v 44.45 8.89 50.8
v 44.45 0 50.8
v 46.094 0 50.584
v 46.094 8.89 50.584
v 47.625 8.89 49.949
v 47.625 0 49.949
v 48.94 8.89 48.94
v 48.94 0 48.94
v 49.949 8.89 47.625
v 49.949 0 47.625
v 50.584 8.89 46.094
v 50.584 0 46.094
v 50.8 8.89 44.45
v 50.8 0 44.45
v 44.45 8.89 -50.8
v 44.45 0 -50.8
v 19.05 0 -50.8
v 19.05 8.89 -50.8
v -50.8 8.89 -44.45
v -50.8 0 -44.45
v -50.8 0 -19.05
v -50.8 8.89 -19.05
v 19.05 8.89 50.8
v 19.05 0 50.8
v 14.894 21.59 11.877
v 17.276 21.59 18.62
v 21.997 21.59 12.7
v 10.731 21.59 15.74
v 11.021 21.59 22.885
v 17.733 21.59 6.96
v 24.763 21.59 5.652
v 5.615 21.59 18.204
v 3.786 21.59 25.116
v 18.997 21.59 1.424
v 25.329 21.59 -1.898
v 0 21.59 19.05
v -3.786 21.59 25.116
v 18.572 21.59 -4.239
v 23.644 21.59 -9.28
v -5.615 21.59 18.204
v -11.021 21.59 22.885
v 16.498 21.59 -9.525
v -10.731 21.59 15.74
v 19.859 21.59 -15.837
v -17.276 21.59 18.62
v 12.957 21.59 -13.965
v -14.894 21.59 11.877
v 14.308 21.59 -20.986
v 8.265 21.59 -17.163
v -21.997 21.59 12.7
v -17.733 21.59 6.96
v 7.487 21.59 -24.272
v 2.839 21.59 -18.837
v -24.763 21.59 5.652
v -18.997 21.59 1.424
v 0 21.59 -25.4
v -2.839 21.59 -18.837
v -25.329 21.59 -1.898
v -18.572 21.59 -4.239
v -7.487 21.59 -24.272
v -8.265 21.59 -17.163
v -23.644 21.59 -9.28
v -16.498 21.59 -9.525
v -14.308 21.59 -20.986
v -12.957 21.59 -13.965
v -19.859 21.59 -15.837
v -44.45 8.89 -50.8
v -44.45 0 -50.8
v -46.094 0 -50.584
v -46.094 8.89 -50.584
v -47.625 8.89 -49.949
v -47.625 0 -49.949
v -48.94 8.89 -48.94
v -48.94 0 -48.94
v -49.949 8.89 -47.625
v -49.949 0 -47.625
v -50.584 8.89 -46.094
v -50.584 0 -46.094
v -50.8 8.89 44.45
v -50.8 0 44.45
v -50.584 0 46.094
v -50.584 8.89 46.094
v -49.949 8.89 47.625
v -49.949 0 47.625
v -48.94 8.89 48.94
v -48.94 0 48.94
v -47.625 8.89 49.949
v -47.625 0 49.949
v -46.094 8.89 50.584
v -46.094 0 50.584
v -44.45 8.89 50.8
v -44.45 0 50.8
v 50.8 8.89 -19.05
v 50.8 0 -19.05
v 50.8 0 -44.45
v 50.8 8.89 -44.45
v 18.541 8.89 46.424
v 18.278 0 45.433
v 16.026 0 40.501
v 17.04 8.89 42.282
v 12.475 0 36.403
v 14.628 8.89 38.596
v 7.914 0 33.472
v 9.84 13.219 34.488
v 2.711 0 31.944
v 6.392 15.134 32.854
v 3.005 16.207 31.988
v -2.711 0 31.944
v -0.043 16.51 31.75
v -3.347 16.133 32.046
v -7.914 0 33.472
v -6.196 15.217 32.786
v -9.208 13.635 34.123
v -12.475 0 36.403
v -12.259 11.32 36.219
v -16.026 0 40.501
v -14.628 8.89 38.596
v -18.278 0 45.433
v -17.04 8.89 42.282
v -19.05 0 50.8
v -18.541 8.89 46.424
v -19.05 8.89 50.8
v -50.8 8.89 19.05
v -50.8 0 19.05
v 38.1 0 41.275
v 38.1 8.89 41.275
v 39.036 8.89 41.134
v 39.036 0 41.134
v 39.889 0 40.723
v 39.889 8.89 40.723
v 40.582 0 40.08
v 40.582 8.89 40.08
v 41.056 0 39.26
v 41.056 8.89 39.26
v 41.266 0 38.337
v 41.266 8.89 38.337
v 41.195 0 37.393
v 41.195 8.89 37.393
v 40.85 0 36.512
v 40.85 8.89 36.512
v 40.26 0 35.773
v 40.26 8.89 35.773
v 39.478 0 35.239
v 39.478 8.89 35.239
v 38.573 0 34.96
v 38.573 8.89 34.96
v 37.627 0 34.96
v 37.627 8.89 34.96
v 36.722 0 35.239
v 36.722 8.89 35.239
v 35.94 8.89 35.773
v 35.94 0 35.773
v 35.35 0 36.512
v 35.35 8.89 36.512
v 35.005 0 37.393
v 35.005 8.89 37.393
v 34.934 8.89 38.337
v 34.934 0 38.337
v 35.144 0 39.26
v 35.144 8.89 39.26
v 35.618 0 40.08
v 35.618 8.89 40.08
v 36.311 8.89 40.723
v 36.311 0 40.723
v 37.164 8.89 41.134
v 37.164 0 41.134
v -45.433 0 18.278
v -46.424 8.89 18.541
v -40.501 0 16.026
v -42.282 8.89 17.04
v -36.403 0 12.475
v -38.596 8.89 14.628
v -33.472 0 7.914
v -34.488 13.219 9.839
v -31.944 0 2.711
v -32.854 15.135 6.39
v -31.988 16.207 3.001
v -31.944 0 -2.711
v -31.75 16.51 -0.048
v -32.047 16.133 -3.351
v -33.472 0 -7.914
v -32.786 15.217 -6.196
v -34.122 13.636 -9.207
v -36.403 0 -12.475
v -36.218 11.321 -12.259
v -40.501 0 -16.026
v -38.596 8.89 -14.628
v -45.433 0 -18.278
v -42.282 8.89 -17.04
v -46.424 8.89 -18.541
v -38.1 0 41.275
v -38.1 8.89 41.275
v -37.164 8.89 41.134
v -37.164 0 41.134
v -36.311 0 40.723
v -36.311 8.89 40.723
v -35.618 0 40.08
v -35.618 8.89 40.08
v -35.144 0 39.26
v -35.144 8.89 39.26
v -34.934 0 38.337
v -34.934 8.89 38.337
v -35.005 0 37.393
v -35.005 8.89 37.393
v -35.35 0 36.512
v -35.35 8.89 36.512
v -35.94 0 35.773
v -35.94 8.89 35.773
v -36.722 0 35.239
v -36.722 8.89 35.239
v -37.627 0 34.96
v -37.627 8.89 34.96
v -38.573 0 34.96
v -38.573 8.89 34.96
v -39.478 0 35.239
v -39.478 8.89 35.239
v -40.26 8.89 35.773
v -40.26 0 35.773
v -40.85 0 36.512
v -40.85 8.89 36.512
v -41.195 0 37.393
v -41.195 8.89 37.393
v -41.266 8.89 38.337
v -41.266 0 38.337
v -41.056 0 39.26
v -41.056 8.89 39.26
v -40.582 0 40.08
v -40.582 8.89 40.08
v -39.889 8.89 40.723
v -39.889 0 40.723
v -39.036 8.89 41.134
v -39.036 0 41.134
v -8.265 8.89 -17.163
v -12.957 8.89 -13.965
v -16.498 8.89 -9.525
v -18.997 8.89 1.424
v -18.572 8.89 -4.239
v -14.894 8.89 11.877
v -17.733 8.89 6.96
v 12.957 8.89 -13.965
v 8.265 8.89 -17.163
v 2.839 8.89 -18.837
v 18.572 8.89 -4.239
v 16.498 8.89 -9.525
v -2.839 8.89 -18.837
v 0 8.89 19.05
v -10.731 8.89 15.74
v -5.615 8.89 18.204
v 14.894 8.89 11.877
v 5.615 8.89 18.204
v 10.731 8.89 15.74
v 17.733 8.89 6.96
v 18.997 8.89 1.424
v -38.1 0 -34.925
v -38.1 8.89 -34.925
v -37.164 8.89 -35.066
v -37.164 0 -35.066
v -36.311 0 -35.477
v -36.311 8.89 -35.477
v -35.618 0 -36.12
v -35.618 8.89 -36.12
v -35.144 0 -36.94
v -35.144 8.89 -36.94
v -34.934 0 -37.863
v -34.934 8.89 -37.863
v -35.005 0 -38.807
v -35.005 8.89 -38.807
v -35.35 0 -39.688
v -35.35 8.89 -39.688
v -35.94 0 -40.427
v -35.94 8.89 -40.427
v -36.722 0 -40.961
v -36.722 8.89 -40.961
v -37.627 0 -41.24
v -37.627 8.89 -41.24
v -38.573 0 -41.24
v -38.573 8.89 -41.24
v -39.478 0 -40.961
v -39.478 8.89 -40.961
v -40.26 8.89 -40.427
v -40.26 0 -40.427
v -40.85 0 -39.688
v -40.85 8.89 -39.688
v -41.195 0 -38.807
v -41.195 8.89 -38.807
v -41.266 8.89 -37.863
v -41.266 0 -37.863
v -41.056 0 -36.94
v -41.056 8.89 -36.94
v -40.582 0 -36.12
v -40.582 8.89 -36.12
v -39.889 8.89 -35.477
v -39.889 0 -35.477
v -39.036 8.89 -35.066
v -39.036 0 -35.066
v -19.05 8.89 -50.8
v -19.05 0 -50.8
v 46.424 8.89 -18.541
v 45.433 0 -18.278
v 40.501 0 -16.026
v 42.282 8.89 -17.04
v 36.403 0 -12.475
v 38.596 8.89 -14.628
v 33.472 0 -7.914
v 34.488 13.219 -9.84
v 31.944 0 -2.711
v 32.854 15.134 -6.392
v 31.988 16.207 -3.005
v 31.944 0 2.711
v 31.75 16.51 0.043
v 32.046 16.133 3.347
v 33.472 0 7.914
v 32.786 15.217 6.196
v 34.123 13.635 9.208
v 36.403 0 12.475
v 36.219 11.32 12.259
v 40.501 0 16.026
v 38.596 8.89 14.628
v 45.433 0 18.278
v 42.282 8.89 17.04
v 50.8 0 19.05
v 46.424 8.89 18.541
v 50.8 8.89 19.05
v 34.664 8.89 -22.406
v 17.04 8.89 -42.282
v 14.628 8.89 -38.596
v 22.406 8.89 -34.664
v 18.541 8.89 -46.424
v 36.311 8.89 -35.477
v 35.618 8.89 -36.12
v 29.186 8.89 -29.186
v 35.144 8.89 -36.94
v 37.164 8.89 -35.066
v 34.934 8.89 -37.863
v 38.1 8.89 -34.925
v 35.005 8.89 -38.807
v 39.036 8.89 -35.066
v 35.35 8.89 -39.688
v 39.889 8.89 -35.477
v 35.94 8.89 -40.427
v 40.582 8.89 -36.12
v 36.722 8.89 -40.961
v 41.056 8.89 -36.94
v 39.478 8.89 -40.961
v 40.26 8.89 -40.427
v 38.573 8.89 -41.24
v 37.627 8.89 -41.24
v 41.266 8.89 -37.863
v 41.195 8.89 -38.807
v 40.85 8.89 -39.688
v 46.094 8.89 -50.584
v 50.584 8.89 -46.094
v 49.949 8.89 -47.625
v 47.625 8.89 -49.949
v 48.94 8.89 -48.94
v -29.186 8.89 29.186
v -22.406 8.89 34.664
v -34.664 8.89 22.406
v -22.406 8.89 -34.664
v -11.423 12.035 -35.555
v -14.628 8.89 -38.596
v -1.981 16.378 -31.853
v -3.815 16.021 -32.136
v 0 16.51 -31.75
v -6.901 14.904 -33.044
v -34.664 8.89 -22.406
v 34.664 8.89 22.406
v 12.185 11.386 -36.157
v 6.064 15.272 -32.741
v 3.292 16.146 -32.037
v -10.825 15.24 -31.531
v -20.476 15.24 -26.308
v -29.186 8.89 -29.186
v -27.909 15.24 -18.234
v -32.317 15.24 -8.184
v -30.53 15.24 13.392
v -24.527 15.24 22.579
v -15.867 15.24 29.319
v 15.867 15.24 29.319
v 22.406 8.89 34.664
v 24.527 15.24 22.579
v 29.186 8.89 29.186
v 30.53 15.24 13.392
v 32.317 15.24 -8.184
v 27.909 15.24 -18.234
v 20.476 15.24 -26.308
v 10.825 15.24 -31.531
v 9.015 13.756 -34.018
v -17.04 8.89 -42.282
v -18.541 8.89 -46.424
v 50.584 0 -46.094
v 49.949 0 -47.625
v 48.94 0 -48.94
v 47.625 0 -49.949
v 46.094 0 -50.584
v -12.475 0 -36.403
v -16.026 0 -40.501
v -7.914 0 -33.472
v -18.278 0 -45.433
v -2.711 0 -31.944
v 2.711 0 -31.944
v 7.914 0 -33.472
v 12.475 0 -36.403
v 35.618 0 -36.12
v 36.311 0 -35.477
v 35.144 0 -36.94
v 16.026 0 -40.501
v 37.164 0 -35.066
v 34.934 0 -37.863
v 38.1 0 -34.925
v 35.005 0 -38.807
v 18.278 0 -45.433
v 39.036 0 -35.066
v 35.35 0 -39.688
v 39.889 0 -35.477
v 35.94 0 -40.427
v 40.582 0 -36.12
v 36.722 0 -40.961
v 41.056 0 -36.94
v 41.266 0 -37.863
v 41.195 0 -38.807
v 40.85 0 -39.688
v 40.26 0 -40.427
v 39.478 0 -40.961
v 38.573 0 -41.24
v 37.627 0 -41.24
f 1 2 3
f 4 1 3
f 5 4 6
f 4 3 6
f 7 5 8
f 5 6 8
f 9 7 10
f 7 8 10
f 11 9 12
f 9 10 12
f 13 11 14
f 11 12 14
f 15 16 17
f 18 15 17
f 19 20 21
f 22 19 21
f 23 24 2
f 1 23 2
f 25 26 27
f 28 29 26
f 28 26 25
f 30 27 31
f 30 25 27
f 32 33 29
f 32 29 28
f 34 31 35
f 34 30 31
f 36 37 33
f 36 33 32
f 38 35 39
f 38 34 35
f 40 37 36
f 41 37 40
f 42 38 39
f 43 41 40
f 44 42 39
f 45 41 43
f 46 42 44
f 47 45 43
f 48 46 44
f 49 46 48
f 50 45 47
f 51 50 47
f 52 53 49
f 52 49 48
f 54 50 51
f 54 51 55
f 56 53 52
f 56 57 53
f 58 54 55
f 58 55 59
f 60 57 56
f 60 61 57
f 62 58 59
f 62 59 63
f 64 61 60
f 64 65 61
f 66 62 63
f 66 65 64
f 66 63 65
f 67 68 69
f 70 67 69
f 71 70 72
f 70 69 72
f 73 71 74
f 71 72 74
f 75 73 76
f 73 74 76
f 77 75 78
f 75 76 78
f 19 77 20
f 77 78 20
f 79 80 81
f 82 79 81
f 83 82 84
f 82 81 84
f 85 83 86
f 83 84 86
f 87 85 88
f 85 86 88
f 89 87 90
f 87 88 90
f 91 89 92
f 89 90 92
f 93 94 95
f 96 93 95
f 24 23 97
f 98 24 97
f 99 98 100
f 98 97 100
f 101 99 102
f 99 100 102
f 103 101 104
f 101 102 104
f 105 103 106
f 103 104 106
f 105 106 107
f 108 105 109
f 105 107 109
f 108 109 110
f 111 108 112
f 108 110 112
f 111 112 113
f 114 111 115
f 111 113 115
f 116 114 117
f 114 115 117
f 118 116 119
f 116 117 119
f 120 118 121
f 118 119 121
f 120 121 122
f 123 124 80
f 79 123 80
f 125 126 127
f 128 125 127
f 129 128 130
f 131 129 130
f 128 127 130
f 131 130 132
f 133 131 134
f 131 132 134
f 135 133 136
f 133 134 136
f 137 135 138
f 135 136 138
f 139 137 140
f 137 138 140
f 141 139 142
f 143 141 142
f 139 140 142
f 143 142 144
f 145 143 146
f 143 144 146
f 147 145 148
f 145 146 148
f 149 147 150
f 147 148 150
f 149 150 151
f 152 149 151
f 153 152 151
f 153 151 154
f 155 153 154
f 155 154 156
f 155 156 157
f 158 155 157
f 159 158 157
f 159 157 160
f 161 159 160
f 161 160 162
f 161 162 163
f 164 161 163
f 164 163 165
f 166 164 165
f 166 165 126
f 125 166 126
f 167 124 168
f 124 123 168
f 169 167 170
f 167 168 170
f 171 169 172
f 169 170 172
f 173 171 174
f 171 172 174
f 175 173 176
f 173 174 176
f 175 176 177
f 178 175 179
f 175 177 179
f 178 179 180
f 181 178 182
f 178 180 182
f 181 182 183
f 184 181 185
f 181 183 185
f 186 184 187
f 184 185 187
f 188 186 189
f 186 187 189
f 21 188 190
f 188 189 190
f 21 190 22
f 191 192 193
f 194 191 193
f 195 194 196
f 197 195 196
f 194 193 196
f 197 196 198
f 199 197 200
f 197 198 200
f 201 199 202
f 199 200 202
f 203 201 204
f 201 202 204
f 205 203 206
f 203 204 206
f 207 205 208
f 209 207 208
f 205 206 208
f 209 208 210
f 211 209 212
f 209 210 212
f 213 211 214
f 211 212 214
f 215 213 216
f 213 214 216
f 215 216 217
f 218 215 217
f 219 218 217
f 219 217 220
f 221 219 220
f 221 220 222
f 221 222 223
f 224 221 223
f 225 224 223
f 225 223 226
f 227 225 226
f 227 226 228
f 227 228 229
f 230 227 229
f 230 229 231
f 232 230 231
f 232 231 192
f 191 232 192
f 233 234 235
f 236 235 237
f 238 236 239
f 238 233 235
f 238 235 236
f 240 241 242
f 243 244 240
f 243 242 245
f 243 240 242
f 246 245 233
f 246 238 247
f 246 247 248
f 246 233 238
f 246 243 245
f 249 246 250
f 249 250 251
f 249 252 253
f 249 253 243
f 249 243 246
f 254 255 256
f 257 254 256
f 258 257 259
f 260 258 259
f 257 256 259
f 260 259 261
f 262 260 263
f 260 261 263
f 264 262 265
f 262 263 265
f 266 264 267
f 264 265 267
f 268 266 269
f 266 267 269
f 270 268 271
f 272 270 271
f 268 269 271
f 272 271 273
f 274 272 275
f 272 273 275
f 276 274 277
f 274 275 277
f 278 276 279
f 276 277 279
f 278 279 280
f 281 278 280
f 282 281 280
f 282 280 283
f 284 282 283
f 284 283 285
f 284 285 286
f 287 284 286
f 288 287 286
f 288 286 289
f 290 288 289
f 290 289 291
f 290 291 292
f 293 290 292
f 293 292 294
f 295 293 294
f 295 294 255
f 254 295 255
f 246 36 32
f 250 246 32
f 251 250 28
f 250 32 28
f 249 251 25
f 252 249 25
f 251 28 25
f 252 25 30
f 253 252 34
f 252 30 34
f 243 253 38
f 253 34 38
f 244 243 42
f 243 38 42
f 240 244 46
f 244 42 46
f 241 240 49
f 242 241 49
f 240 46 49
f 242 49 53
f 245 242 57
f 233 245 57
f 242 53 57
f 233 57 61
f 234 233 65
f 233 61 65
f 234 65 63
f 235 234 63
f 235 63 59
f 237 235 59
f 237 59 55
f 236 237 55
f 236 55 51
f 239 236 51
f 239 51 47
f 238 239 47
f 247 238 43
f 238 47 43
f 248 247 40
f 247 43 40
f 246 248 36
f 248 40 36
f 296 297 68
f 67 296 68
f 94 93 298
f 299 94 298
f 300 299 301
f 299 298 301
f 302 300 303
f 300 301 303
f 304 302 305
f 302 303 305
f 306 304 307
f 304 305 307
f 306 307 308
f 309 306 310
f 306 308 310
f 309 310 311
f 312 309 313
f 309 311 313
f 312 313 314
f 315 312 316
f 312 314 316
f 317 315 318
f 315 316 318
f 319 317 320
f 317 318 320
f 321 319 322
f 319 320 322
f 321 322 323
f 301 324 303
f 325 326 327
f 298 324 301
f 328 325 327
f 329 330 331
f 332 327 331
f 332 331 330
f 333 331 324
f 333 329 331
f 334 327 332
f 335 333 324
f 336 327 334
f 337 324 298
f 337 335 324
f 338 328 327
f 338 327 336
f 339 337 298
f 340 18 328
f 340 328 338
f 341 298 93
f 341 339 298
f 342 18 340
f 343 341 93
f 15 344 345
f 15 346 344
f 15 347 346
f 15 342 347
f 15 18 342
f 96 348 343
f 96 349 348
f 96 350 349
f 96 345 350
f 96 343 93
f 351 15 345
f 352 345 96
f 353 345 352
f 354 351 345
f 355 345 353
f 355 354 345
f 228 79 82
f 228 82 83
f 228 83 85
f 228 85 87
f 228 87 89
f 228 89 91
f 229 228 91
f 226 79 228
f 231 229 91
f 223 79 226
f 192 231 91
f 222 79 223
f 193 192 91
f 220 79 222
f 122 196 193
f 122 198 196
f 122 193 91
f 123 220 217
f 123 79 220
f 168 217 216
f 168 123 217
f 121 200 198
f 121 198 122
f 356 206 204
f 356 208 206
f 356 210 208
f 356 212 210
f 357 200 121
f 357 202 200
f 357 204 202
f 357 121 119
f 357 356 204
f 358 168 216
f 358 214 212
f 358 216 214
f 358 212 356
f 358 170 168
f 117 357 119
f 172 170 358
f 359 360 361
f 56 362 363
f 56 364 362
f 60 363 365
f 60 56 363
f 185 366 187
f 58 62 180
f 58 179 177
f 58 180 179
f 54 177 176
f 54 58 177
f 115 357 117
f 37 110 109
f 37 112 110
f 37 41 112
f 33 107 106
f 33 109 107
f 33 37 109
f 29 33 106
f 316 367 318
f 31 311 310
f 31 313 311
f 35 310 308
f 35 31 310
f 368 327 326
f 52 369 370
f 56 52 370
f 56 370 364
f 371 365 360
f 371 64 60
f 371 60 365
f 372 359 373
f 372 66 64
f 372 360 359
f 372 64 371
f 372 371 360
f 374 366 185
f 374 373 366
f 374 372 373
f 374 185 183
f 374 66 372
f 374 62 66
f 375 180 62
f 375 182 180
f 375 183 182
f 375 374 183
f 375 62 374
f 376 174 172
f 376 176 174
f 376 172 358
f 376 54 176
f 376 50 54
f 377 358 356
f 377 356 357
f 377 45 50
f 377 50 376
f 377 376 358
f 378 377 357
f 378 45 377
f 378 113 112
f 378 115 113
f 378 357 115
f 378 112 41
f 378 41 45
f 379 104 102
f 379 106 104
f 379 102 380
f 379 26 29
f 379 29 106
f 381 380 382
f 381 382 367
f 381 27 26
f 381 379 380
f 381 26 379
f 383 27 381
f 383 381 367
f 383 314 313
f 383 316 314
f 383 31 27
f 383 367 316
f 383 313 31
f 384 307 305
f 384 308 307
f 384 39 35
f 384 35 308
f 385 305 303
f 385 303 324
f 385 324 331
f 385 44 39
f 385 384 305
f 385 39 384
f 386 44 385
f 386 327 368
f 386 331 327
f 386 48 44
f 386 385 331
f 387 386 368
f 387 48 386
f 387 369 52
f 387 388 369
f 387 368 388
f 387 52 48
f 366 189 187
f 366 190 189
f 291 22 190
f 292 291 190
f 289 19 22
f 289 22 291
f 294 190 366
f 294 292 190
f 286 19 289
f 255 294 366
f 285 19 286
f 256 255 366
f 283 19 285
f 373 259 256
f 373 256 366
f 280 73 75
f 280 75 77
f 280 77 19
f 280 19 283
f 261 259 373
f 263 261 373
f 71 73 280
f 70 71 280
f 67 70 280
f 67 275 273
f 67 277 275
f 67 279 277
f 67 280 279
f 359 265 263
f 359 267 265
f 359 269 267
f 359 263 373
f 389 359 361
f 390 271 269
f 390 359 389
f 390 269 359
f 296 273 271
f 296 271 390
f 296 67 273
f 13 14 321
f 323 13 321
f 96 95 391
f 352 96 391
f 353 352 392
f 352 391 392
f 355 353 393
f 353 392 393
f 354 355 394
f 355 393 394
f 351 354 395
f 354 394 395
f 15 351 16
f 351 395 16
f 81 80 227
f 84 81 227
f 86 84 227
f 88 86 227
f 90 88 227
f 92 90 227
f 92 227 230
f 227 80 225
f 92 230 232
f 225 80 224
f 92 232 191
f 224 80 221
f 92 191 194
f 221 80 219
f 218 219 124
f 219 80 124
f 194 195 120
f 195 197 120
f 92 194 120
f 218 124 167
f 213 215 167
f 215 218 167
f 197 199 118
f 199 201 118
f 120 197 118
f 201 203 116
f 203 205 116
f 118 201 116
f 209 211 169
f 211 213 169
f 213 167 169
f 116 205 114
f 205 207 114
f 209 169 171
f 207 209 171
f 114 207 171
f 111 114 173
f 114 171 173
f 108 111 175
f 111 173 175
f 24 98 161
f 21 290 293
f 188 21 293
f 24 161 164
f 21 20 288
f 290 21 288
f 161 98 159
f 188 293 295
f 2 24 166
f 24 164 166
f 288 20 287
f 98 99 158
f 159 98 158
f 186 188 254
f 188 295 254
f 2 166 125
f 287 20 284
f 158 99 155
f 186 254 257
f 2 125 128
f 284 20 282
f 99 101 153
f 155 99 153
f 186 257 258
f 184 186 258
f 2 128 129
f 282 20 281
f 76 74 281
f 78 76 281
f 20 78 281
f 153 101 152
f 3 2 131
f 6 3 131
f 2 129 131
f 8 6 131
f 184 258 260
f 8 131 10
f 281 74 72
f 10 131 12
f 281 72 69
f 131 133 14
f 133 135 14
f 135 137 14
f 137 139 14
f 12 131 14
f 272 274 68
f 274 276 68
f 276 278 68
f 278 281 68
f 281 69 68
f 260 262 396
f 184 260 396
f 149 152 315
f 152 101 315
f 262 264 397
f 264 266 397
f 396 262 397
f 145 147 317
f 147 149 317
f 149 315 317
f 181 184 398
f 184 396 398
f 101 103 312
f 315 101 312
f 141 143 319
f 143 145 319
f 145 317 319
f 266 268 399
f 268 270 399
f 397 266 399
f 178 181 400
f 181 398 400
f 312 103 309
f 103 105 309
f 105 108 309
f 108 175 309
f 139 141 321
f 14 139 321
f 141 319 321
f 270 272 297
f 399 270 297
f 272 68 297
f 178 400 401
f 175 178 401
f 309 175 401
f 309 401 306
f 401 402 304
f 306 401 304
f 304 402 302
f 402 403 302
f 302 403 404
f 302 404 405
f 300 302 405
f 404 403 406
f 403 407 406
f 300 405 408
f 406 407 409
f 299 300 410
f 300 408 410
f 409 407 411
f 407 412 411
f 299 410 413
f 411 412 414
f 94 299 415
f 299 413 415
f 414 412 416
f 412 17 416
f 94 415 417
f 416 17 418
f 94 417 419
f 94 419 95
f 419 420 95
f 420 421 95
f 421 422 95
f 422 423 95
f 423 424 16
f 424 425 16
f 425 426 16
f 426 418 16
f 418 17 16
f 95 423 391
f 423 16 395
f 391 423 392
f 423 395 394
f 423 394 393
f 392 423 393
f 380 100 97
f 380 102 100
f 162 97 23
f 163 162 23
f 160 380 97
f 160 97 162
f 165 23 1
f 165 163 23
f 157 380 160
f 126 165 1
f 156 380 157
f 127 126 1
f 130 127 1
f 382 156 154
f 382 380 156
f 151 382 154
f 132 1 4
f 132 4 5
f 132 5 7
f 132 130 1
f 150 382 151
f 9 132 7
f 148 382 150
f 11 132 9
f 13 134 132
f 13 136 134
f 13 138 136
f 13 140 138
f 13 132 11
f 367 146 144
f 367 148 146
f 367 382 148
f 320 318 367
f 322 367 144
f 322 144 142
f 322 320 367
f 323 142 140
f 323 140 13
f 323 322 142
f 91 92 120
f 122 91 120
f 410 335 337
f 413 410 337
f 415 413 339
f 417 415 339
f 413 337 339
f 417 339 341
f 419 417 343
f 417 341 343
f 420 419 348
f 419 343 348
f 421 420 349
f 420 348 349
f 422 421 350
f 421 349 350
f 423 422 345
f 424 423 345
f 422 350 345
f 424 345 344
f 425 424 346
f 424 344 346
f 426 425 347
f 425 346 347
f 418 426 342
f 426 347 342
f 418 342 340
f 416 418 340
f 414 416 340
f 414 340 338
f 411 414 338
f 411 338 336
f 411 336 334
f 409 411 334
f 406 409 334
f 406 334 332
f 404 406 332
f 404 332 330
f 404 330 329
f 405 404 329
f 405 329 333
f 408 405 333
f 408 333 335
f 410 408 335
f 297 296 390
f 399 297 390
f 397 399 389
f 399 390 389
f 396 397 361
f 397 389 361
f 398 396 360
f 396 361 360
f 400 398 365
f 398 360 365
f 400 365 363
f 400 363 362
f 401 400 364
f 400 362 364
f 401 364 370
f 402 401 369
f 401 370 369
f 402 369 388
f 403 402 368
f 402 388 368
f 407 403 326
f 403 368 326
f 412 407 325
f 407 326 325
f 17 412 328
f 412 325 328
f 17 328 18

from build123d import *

# Parameters (mm, degrees)
BOSS_EXTRUDE1_DEPTH = 8.89
SKETCH3_R           = 19.05
SKETCH3_R_2         = 3.175
CUT_EXTRUDE1_DEPTH  = 76.016052282
SKETCH3_3_R         = 19.05
CUT_EXTRUDE2_DEPTH  = 12.7


with BuildPart() as part:
    # Sketch1 → Boss-Extrude1 (new body)
    with BuildSketch(Plane(origin=(0, 0, 0), x_dir=(1, 0, 0), z_dir=(0, 1, 0))):
        with BuildLine():
            Line((-44.45, -50.8), (44.45, -50.8))
            ThreePointArc((44.45, -50.8), (48.940128061, -48.940128061), (50.8, -44.45))
            Line((50.8, -44.45), (50.8, 44.45))
            ThreePointArc((50.8, 44.45), (48.940128061, 48.940128061), (44.45, 50.8))
            Line((44.45, 50.8), (-44.45, 50.8))
            ThreePointArc((-44.45, 50.8), (-48.940128061, 48.940128061), (-50.8, 44.45))
            Line((-50.8, 44.45), (-50.8, -44.45))
            ThreePointArc((-50.8, -44.45), (-48.940128061, -48.940128061), (-44.45, -50.8))
        make_face()
    extrude(amount=BOSS_EXTRUDE1_DEPTH)

    # Sketch2 → Revolve1 (revolve)
    with BuildSketch(Plane.XY, mode=Mode.PRIVATE) as revolve1_sk:
        Polygon((0, 21.59), (0, 8.89), (41.275, 8.89), (25.4, 21.59), align=None)
    revolve(revolve1_sk.sketch.rotate(Axis((0, -26.658191996, 0), (0, 1, 0)), 90), axis=Axis((0, -26.658191996, 0), (0, 1, 0)))

    # Sketch3 → Cut-Extrude1 (cut, through all)
    with BuildSketch(Plane(origin=(0, 21.59, 0), x_dir=(1, 0, 0), z_dir=(0, 1, 0))):
        with Locations((-50.8, 0)):
            Circle(SKETCH3_R)
        with Locations((0, 50.8)):
            Circle(SKETCH3_R)
        with Locations((0, -50.8)):
            Circle(SKETCH3_R)
        with Locations((50.8, 0)):
            Circle(SKETCH3_R)
        with Locations(Location((38.1, -38.1, 0), (0, 0, 270))):
            Circle(SKETCH3_R_2)
        with Locations(Location((38.1, 38.1, 0), (0, 0, 270))):
            Circle(SKETCH3_R_2)
        with Locations(Location((-38.1, 38.1, 0), (0, 0, 270))):
            Circle(SKETCH3_R_2)
        with Locations(Location((-38.1, -38.1, 0), (0, 0, 270))):
            Circle(SKETCH3_R_2)
    extrude(amount=-CUT_EXTRUDE1_DEPTH, mode=Mode.SUBTRACT)

    # Sketch3<3> → Cut-Extrude2 (cut)
    with BuildSketch(Plane(origin=(0, 21.59, 0), x_dir=(1, 0, 0), z_dir=(0, 1, 0))):
        with Locations(Location((0, 0, 0), (0, 0, 270))):
            Circle(SKETCH3_3_R)
    extrude(amount=-CUT_EXTRUDE2_DEPTH, mode=Mode.SUBTRACT)


solid = part.part
